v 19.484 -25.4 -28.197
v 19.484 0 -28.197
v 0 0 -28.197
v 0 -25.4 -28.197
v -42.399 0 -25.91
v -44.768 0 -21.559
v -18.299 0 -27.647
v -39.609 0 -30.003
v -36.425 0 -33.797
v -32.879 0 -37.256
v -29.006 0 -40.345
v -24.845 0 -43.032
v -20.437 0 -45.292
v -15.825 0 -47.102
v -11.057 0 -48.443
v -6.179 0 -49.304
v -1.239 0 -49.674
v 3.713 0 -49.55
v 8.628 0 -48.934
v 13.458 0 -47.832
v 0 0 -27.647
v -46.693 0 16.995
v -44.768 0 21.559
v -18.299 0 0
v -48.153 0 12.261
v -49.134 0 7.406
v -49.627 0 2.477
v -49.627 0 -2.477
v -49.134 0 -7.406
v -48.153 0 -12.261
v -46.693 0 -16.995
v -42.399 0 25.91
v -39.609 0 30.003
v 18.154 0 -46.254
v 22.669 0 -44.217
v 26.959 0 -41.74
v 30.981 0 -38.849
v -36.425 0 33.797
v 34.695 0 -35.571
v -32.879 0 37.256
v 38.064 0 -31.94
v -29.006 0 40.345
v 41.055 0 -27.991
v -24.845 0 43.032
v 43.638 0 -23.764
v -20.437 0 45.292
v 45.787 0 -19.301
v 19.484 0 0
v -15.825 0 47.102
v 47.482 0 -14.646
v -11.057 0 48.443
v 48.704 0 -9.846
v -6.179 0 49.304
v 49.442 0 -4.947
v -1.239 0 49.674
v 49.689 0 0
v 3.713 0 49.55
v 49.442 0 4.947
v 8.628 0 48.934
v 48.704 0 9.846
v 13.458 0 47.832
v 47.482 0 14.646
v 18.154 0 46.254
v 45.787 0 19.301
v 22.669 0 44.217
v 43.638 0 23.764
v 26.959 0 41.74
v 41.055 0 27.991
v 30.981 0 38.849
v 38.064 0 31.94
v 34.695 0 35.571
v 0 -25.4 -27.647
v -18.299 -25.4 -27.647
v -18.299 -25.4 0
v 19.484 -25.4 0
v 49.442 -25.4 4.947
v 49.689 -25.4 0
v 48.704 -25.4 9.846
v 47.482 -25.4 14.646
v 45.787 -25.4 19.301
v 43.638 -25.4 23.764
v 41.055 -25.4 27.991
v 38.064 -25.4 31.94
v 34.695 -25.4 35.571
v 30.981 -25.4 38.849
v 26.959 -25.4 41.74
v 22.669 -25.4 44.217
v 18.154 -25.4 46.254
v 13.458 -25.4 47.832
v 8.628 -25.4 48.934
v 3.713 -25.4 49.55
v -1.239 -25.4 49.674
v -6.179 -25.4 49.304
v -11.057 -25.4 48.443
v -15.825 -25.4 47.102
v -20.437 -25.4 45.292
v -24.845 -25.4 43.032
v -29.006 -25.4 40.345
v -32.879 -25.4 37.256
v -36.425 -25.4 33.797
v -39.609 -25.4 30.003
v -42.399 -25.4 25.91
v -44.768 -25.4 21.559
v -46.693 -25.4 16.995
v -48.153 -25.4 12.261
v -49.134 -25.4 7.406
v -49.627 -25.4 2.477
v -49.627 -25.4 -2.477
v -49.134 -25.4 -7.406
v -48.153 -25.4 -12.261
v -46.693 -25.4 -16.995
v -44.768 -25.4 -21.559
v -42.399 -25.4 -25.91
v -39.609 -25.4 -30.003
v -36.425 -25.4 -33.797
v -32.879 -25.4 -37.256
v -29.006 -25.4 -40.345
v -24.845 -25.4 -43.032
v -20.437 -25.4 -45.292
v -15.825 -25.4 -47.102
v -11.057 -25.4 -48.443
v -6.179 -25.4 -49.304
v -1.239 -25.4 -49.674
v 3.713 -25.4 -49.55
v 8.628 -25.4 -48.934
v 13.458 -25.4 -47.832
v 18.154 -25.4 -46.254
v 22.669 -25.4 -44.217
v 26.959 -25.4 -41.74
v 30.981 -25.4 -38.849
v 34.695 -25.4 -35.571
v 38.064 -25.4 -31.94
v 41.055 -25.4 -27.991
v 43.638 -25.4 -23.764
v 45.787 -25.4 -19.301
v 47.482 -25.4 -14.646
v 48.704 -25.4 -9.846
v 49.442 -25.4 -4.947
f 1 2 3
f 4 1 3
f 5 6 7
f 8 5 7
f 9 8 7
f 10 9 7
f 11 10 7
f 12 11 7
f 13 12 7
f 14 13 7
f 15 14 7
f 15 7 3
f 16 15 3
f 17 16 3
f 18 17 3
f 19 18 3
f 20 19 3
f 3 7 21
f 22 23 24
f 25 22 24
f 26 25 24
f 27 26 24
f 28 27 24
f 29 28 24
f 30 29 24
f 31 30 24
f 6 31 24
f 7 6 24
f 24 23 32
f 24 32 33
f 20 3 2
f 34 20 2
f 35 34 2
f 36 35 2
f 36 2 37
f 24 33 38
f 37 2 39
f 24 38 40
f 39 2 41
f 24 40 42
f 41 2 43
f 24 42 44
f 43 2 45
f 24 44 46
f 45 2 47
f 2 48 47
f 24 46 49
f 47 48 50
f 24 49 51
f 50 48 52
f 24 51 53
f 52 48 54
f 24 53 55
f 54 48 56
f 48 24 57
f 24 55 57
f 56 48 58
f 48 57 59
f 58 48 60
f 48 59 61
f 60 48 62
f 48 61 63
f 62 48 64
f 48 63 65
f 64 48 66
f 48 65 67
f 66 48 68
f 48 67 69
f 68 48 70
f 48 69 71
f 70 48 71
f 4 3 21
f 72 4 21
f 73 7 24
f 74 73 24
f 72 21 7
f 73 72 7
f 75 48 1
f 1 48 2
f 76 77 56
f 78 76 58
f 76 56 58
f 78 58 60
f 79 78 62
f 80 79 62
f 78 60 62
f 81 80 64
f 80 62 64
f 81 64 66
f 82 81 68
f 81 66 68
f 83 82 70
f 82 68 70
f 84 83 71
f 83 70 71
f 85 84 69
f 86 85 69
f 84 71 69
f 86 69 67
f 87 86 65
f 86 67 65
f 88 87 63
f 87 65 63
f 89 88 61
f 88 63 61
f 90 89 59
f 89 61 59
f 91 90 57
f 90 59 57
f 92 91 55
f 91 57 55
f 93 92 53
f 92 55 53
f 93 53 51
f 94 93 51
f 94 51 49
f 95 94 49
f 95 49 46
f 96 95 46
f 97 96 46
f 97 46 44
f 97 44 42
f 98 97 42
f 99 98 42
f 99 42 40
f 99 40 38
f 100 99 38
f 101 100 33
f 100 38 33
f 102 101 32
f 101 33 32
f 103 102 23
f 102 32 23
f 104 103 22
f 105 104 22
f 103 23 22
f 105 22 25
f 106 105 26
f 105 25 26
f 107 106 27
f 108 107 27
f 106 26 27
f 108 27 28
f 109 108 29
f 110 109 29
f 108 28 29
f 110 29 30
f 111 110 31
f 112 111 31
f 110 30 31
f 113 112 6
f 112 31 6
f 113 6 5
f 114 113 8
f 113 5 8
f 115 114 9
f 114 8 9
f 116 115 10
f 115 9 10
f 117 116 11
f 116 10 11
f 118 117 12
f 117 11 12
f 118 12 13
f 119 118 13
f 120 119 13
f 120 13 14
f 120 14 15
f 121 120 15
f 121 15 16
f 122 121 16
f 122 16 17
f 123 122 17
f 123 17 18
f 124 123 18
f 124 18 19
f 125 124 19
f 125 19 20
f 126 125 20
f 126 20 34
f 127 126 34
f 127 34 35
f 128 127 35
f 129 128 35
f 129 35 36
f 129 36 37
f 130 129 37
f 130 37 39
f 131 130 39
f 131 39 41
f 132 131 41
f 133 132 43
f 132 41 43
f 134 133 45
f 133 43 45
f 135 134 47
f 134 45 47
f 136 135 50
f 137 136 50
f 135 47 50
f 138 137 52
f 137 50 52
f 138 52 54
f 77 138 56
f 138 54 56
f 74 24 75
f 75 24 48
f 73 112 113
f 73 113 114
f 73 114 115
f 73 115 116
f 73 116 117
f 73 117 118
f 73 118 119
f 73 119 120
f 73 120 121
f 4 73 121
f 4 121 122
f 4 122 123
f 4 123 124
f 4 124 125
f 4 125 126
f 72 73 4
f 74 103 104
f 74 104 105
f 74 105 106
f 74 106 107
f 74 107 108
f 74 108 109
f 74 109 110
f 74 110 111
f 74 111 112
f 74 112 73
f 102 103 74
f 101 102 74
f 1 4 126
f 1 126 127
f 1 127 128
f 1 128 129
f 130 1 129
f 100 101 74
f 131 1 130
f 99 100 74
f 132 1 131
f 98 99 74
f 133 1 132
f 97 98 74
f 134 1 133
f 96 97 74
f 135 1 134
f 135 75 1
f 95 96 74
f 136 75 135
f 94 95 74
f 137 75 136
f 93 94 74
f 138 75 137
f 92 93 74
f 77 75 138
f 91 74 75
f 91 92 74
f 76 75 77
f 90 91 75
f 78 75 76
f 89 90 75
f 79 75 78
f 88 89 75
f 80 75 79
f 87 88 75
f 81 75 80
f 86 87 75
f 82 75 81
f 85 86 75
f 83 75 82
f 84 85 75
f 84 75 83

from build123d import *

# Parameters (mm, degrees)
F0_R     = 49.689241
F1_DEPTH = 25.4


with BuildPart() as f1:
    # F0 (on Front) → F1 (new body)
    with BuildSketch(Plane.XZ):
        Circle(F0_R)
        Polygon((-18.298686, 0), (0, 0), (19.484133, 0), (19.484133, -28.196737), (0, -28.196737), (0, -27.647451), (-18.298686, -27.647451), align=None, mode=Mode.SUBTRACT)
    extrude(amount=F1_DEPTH)


solid = f1.part
